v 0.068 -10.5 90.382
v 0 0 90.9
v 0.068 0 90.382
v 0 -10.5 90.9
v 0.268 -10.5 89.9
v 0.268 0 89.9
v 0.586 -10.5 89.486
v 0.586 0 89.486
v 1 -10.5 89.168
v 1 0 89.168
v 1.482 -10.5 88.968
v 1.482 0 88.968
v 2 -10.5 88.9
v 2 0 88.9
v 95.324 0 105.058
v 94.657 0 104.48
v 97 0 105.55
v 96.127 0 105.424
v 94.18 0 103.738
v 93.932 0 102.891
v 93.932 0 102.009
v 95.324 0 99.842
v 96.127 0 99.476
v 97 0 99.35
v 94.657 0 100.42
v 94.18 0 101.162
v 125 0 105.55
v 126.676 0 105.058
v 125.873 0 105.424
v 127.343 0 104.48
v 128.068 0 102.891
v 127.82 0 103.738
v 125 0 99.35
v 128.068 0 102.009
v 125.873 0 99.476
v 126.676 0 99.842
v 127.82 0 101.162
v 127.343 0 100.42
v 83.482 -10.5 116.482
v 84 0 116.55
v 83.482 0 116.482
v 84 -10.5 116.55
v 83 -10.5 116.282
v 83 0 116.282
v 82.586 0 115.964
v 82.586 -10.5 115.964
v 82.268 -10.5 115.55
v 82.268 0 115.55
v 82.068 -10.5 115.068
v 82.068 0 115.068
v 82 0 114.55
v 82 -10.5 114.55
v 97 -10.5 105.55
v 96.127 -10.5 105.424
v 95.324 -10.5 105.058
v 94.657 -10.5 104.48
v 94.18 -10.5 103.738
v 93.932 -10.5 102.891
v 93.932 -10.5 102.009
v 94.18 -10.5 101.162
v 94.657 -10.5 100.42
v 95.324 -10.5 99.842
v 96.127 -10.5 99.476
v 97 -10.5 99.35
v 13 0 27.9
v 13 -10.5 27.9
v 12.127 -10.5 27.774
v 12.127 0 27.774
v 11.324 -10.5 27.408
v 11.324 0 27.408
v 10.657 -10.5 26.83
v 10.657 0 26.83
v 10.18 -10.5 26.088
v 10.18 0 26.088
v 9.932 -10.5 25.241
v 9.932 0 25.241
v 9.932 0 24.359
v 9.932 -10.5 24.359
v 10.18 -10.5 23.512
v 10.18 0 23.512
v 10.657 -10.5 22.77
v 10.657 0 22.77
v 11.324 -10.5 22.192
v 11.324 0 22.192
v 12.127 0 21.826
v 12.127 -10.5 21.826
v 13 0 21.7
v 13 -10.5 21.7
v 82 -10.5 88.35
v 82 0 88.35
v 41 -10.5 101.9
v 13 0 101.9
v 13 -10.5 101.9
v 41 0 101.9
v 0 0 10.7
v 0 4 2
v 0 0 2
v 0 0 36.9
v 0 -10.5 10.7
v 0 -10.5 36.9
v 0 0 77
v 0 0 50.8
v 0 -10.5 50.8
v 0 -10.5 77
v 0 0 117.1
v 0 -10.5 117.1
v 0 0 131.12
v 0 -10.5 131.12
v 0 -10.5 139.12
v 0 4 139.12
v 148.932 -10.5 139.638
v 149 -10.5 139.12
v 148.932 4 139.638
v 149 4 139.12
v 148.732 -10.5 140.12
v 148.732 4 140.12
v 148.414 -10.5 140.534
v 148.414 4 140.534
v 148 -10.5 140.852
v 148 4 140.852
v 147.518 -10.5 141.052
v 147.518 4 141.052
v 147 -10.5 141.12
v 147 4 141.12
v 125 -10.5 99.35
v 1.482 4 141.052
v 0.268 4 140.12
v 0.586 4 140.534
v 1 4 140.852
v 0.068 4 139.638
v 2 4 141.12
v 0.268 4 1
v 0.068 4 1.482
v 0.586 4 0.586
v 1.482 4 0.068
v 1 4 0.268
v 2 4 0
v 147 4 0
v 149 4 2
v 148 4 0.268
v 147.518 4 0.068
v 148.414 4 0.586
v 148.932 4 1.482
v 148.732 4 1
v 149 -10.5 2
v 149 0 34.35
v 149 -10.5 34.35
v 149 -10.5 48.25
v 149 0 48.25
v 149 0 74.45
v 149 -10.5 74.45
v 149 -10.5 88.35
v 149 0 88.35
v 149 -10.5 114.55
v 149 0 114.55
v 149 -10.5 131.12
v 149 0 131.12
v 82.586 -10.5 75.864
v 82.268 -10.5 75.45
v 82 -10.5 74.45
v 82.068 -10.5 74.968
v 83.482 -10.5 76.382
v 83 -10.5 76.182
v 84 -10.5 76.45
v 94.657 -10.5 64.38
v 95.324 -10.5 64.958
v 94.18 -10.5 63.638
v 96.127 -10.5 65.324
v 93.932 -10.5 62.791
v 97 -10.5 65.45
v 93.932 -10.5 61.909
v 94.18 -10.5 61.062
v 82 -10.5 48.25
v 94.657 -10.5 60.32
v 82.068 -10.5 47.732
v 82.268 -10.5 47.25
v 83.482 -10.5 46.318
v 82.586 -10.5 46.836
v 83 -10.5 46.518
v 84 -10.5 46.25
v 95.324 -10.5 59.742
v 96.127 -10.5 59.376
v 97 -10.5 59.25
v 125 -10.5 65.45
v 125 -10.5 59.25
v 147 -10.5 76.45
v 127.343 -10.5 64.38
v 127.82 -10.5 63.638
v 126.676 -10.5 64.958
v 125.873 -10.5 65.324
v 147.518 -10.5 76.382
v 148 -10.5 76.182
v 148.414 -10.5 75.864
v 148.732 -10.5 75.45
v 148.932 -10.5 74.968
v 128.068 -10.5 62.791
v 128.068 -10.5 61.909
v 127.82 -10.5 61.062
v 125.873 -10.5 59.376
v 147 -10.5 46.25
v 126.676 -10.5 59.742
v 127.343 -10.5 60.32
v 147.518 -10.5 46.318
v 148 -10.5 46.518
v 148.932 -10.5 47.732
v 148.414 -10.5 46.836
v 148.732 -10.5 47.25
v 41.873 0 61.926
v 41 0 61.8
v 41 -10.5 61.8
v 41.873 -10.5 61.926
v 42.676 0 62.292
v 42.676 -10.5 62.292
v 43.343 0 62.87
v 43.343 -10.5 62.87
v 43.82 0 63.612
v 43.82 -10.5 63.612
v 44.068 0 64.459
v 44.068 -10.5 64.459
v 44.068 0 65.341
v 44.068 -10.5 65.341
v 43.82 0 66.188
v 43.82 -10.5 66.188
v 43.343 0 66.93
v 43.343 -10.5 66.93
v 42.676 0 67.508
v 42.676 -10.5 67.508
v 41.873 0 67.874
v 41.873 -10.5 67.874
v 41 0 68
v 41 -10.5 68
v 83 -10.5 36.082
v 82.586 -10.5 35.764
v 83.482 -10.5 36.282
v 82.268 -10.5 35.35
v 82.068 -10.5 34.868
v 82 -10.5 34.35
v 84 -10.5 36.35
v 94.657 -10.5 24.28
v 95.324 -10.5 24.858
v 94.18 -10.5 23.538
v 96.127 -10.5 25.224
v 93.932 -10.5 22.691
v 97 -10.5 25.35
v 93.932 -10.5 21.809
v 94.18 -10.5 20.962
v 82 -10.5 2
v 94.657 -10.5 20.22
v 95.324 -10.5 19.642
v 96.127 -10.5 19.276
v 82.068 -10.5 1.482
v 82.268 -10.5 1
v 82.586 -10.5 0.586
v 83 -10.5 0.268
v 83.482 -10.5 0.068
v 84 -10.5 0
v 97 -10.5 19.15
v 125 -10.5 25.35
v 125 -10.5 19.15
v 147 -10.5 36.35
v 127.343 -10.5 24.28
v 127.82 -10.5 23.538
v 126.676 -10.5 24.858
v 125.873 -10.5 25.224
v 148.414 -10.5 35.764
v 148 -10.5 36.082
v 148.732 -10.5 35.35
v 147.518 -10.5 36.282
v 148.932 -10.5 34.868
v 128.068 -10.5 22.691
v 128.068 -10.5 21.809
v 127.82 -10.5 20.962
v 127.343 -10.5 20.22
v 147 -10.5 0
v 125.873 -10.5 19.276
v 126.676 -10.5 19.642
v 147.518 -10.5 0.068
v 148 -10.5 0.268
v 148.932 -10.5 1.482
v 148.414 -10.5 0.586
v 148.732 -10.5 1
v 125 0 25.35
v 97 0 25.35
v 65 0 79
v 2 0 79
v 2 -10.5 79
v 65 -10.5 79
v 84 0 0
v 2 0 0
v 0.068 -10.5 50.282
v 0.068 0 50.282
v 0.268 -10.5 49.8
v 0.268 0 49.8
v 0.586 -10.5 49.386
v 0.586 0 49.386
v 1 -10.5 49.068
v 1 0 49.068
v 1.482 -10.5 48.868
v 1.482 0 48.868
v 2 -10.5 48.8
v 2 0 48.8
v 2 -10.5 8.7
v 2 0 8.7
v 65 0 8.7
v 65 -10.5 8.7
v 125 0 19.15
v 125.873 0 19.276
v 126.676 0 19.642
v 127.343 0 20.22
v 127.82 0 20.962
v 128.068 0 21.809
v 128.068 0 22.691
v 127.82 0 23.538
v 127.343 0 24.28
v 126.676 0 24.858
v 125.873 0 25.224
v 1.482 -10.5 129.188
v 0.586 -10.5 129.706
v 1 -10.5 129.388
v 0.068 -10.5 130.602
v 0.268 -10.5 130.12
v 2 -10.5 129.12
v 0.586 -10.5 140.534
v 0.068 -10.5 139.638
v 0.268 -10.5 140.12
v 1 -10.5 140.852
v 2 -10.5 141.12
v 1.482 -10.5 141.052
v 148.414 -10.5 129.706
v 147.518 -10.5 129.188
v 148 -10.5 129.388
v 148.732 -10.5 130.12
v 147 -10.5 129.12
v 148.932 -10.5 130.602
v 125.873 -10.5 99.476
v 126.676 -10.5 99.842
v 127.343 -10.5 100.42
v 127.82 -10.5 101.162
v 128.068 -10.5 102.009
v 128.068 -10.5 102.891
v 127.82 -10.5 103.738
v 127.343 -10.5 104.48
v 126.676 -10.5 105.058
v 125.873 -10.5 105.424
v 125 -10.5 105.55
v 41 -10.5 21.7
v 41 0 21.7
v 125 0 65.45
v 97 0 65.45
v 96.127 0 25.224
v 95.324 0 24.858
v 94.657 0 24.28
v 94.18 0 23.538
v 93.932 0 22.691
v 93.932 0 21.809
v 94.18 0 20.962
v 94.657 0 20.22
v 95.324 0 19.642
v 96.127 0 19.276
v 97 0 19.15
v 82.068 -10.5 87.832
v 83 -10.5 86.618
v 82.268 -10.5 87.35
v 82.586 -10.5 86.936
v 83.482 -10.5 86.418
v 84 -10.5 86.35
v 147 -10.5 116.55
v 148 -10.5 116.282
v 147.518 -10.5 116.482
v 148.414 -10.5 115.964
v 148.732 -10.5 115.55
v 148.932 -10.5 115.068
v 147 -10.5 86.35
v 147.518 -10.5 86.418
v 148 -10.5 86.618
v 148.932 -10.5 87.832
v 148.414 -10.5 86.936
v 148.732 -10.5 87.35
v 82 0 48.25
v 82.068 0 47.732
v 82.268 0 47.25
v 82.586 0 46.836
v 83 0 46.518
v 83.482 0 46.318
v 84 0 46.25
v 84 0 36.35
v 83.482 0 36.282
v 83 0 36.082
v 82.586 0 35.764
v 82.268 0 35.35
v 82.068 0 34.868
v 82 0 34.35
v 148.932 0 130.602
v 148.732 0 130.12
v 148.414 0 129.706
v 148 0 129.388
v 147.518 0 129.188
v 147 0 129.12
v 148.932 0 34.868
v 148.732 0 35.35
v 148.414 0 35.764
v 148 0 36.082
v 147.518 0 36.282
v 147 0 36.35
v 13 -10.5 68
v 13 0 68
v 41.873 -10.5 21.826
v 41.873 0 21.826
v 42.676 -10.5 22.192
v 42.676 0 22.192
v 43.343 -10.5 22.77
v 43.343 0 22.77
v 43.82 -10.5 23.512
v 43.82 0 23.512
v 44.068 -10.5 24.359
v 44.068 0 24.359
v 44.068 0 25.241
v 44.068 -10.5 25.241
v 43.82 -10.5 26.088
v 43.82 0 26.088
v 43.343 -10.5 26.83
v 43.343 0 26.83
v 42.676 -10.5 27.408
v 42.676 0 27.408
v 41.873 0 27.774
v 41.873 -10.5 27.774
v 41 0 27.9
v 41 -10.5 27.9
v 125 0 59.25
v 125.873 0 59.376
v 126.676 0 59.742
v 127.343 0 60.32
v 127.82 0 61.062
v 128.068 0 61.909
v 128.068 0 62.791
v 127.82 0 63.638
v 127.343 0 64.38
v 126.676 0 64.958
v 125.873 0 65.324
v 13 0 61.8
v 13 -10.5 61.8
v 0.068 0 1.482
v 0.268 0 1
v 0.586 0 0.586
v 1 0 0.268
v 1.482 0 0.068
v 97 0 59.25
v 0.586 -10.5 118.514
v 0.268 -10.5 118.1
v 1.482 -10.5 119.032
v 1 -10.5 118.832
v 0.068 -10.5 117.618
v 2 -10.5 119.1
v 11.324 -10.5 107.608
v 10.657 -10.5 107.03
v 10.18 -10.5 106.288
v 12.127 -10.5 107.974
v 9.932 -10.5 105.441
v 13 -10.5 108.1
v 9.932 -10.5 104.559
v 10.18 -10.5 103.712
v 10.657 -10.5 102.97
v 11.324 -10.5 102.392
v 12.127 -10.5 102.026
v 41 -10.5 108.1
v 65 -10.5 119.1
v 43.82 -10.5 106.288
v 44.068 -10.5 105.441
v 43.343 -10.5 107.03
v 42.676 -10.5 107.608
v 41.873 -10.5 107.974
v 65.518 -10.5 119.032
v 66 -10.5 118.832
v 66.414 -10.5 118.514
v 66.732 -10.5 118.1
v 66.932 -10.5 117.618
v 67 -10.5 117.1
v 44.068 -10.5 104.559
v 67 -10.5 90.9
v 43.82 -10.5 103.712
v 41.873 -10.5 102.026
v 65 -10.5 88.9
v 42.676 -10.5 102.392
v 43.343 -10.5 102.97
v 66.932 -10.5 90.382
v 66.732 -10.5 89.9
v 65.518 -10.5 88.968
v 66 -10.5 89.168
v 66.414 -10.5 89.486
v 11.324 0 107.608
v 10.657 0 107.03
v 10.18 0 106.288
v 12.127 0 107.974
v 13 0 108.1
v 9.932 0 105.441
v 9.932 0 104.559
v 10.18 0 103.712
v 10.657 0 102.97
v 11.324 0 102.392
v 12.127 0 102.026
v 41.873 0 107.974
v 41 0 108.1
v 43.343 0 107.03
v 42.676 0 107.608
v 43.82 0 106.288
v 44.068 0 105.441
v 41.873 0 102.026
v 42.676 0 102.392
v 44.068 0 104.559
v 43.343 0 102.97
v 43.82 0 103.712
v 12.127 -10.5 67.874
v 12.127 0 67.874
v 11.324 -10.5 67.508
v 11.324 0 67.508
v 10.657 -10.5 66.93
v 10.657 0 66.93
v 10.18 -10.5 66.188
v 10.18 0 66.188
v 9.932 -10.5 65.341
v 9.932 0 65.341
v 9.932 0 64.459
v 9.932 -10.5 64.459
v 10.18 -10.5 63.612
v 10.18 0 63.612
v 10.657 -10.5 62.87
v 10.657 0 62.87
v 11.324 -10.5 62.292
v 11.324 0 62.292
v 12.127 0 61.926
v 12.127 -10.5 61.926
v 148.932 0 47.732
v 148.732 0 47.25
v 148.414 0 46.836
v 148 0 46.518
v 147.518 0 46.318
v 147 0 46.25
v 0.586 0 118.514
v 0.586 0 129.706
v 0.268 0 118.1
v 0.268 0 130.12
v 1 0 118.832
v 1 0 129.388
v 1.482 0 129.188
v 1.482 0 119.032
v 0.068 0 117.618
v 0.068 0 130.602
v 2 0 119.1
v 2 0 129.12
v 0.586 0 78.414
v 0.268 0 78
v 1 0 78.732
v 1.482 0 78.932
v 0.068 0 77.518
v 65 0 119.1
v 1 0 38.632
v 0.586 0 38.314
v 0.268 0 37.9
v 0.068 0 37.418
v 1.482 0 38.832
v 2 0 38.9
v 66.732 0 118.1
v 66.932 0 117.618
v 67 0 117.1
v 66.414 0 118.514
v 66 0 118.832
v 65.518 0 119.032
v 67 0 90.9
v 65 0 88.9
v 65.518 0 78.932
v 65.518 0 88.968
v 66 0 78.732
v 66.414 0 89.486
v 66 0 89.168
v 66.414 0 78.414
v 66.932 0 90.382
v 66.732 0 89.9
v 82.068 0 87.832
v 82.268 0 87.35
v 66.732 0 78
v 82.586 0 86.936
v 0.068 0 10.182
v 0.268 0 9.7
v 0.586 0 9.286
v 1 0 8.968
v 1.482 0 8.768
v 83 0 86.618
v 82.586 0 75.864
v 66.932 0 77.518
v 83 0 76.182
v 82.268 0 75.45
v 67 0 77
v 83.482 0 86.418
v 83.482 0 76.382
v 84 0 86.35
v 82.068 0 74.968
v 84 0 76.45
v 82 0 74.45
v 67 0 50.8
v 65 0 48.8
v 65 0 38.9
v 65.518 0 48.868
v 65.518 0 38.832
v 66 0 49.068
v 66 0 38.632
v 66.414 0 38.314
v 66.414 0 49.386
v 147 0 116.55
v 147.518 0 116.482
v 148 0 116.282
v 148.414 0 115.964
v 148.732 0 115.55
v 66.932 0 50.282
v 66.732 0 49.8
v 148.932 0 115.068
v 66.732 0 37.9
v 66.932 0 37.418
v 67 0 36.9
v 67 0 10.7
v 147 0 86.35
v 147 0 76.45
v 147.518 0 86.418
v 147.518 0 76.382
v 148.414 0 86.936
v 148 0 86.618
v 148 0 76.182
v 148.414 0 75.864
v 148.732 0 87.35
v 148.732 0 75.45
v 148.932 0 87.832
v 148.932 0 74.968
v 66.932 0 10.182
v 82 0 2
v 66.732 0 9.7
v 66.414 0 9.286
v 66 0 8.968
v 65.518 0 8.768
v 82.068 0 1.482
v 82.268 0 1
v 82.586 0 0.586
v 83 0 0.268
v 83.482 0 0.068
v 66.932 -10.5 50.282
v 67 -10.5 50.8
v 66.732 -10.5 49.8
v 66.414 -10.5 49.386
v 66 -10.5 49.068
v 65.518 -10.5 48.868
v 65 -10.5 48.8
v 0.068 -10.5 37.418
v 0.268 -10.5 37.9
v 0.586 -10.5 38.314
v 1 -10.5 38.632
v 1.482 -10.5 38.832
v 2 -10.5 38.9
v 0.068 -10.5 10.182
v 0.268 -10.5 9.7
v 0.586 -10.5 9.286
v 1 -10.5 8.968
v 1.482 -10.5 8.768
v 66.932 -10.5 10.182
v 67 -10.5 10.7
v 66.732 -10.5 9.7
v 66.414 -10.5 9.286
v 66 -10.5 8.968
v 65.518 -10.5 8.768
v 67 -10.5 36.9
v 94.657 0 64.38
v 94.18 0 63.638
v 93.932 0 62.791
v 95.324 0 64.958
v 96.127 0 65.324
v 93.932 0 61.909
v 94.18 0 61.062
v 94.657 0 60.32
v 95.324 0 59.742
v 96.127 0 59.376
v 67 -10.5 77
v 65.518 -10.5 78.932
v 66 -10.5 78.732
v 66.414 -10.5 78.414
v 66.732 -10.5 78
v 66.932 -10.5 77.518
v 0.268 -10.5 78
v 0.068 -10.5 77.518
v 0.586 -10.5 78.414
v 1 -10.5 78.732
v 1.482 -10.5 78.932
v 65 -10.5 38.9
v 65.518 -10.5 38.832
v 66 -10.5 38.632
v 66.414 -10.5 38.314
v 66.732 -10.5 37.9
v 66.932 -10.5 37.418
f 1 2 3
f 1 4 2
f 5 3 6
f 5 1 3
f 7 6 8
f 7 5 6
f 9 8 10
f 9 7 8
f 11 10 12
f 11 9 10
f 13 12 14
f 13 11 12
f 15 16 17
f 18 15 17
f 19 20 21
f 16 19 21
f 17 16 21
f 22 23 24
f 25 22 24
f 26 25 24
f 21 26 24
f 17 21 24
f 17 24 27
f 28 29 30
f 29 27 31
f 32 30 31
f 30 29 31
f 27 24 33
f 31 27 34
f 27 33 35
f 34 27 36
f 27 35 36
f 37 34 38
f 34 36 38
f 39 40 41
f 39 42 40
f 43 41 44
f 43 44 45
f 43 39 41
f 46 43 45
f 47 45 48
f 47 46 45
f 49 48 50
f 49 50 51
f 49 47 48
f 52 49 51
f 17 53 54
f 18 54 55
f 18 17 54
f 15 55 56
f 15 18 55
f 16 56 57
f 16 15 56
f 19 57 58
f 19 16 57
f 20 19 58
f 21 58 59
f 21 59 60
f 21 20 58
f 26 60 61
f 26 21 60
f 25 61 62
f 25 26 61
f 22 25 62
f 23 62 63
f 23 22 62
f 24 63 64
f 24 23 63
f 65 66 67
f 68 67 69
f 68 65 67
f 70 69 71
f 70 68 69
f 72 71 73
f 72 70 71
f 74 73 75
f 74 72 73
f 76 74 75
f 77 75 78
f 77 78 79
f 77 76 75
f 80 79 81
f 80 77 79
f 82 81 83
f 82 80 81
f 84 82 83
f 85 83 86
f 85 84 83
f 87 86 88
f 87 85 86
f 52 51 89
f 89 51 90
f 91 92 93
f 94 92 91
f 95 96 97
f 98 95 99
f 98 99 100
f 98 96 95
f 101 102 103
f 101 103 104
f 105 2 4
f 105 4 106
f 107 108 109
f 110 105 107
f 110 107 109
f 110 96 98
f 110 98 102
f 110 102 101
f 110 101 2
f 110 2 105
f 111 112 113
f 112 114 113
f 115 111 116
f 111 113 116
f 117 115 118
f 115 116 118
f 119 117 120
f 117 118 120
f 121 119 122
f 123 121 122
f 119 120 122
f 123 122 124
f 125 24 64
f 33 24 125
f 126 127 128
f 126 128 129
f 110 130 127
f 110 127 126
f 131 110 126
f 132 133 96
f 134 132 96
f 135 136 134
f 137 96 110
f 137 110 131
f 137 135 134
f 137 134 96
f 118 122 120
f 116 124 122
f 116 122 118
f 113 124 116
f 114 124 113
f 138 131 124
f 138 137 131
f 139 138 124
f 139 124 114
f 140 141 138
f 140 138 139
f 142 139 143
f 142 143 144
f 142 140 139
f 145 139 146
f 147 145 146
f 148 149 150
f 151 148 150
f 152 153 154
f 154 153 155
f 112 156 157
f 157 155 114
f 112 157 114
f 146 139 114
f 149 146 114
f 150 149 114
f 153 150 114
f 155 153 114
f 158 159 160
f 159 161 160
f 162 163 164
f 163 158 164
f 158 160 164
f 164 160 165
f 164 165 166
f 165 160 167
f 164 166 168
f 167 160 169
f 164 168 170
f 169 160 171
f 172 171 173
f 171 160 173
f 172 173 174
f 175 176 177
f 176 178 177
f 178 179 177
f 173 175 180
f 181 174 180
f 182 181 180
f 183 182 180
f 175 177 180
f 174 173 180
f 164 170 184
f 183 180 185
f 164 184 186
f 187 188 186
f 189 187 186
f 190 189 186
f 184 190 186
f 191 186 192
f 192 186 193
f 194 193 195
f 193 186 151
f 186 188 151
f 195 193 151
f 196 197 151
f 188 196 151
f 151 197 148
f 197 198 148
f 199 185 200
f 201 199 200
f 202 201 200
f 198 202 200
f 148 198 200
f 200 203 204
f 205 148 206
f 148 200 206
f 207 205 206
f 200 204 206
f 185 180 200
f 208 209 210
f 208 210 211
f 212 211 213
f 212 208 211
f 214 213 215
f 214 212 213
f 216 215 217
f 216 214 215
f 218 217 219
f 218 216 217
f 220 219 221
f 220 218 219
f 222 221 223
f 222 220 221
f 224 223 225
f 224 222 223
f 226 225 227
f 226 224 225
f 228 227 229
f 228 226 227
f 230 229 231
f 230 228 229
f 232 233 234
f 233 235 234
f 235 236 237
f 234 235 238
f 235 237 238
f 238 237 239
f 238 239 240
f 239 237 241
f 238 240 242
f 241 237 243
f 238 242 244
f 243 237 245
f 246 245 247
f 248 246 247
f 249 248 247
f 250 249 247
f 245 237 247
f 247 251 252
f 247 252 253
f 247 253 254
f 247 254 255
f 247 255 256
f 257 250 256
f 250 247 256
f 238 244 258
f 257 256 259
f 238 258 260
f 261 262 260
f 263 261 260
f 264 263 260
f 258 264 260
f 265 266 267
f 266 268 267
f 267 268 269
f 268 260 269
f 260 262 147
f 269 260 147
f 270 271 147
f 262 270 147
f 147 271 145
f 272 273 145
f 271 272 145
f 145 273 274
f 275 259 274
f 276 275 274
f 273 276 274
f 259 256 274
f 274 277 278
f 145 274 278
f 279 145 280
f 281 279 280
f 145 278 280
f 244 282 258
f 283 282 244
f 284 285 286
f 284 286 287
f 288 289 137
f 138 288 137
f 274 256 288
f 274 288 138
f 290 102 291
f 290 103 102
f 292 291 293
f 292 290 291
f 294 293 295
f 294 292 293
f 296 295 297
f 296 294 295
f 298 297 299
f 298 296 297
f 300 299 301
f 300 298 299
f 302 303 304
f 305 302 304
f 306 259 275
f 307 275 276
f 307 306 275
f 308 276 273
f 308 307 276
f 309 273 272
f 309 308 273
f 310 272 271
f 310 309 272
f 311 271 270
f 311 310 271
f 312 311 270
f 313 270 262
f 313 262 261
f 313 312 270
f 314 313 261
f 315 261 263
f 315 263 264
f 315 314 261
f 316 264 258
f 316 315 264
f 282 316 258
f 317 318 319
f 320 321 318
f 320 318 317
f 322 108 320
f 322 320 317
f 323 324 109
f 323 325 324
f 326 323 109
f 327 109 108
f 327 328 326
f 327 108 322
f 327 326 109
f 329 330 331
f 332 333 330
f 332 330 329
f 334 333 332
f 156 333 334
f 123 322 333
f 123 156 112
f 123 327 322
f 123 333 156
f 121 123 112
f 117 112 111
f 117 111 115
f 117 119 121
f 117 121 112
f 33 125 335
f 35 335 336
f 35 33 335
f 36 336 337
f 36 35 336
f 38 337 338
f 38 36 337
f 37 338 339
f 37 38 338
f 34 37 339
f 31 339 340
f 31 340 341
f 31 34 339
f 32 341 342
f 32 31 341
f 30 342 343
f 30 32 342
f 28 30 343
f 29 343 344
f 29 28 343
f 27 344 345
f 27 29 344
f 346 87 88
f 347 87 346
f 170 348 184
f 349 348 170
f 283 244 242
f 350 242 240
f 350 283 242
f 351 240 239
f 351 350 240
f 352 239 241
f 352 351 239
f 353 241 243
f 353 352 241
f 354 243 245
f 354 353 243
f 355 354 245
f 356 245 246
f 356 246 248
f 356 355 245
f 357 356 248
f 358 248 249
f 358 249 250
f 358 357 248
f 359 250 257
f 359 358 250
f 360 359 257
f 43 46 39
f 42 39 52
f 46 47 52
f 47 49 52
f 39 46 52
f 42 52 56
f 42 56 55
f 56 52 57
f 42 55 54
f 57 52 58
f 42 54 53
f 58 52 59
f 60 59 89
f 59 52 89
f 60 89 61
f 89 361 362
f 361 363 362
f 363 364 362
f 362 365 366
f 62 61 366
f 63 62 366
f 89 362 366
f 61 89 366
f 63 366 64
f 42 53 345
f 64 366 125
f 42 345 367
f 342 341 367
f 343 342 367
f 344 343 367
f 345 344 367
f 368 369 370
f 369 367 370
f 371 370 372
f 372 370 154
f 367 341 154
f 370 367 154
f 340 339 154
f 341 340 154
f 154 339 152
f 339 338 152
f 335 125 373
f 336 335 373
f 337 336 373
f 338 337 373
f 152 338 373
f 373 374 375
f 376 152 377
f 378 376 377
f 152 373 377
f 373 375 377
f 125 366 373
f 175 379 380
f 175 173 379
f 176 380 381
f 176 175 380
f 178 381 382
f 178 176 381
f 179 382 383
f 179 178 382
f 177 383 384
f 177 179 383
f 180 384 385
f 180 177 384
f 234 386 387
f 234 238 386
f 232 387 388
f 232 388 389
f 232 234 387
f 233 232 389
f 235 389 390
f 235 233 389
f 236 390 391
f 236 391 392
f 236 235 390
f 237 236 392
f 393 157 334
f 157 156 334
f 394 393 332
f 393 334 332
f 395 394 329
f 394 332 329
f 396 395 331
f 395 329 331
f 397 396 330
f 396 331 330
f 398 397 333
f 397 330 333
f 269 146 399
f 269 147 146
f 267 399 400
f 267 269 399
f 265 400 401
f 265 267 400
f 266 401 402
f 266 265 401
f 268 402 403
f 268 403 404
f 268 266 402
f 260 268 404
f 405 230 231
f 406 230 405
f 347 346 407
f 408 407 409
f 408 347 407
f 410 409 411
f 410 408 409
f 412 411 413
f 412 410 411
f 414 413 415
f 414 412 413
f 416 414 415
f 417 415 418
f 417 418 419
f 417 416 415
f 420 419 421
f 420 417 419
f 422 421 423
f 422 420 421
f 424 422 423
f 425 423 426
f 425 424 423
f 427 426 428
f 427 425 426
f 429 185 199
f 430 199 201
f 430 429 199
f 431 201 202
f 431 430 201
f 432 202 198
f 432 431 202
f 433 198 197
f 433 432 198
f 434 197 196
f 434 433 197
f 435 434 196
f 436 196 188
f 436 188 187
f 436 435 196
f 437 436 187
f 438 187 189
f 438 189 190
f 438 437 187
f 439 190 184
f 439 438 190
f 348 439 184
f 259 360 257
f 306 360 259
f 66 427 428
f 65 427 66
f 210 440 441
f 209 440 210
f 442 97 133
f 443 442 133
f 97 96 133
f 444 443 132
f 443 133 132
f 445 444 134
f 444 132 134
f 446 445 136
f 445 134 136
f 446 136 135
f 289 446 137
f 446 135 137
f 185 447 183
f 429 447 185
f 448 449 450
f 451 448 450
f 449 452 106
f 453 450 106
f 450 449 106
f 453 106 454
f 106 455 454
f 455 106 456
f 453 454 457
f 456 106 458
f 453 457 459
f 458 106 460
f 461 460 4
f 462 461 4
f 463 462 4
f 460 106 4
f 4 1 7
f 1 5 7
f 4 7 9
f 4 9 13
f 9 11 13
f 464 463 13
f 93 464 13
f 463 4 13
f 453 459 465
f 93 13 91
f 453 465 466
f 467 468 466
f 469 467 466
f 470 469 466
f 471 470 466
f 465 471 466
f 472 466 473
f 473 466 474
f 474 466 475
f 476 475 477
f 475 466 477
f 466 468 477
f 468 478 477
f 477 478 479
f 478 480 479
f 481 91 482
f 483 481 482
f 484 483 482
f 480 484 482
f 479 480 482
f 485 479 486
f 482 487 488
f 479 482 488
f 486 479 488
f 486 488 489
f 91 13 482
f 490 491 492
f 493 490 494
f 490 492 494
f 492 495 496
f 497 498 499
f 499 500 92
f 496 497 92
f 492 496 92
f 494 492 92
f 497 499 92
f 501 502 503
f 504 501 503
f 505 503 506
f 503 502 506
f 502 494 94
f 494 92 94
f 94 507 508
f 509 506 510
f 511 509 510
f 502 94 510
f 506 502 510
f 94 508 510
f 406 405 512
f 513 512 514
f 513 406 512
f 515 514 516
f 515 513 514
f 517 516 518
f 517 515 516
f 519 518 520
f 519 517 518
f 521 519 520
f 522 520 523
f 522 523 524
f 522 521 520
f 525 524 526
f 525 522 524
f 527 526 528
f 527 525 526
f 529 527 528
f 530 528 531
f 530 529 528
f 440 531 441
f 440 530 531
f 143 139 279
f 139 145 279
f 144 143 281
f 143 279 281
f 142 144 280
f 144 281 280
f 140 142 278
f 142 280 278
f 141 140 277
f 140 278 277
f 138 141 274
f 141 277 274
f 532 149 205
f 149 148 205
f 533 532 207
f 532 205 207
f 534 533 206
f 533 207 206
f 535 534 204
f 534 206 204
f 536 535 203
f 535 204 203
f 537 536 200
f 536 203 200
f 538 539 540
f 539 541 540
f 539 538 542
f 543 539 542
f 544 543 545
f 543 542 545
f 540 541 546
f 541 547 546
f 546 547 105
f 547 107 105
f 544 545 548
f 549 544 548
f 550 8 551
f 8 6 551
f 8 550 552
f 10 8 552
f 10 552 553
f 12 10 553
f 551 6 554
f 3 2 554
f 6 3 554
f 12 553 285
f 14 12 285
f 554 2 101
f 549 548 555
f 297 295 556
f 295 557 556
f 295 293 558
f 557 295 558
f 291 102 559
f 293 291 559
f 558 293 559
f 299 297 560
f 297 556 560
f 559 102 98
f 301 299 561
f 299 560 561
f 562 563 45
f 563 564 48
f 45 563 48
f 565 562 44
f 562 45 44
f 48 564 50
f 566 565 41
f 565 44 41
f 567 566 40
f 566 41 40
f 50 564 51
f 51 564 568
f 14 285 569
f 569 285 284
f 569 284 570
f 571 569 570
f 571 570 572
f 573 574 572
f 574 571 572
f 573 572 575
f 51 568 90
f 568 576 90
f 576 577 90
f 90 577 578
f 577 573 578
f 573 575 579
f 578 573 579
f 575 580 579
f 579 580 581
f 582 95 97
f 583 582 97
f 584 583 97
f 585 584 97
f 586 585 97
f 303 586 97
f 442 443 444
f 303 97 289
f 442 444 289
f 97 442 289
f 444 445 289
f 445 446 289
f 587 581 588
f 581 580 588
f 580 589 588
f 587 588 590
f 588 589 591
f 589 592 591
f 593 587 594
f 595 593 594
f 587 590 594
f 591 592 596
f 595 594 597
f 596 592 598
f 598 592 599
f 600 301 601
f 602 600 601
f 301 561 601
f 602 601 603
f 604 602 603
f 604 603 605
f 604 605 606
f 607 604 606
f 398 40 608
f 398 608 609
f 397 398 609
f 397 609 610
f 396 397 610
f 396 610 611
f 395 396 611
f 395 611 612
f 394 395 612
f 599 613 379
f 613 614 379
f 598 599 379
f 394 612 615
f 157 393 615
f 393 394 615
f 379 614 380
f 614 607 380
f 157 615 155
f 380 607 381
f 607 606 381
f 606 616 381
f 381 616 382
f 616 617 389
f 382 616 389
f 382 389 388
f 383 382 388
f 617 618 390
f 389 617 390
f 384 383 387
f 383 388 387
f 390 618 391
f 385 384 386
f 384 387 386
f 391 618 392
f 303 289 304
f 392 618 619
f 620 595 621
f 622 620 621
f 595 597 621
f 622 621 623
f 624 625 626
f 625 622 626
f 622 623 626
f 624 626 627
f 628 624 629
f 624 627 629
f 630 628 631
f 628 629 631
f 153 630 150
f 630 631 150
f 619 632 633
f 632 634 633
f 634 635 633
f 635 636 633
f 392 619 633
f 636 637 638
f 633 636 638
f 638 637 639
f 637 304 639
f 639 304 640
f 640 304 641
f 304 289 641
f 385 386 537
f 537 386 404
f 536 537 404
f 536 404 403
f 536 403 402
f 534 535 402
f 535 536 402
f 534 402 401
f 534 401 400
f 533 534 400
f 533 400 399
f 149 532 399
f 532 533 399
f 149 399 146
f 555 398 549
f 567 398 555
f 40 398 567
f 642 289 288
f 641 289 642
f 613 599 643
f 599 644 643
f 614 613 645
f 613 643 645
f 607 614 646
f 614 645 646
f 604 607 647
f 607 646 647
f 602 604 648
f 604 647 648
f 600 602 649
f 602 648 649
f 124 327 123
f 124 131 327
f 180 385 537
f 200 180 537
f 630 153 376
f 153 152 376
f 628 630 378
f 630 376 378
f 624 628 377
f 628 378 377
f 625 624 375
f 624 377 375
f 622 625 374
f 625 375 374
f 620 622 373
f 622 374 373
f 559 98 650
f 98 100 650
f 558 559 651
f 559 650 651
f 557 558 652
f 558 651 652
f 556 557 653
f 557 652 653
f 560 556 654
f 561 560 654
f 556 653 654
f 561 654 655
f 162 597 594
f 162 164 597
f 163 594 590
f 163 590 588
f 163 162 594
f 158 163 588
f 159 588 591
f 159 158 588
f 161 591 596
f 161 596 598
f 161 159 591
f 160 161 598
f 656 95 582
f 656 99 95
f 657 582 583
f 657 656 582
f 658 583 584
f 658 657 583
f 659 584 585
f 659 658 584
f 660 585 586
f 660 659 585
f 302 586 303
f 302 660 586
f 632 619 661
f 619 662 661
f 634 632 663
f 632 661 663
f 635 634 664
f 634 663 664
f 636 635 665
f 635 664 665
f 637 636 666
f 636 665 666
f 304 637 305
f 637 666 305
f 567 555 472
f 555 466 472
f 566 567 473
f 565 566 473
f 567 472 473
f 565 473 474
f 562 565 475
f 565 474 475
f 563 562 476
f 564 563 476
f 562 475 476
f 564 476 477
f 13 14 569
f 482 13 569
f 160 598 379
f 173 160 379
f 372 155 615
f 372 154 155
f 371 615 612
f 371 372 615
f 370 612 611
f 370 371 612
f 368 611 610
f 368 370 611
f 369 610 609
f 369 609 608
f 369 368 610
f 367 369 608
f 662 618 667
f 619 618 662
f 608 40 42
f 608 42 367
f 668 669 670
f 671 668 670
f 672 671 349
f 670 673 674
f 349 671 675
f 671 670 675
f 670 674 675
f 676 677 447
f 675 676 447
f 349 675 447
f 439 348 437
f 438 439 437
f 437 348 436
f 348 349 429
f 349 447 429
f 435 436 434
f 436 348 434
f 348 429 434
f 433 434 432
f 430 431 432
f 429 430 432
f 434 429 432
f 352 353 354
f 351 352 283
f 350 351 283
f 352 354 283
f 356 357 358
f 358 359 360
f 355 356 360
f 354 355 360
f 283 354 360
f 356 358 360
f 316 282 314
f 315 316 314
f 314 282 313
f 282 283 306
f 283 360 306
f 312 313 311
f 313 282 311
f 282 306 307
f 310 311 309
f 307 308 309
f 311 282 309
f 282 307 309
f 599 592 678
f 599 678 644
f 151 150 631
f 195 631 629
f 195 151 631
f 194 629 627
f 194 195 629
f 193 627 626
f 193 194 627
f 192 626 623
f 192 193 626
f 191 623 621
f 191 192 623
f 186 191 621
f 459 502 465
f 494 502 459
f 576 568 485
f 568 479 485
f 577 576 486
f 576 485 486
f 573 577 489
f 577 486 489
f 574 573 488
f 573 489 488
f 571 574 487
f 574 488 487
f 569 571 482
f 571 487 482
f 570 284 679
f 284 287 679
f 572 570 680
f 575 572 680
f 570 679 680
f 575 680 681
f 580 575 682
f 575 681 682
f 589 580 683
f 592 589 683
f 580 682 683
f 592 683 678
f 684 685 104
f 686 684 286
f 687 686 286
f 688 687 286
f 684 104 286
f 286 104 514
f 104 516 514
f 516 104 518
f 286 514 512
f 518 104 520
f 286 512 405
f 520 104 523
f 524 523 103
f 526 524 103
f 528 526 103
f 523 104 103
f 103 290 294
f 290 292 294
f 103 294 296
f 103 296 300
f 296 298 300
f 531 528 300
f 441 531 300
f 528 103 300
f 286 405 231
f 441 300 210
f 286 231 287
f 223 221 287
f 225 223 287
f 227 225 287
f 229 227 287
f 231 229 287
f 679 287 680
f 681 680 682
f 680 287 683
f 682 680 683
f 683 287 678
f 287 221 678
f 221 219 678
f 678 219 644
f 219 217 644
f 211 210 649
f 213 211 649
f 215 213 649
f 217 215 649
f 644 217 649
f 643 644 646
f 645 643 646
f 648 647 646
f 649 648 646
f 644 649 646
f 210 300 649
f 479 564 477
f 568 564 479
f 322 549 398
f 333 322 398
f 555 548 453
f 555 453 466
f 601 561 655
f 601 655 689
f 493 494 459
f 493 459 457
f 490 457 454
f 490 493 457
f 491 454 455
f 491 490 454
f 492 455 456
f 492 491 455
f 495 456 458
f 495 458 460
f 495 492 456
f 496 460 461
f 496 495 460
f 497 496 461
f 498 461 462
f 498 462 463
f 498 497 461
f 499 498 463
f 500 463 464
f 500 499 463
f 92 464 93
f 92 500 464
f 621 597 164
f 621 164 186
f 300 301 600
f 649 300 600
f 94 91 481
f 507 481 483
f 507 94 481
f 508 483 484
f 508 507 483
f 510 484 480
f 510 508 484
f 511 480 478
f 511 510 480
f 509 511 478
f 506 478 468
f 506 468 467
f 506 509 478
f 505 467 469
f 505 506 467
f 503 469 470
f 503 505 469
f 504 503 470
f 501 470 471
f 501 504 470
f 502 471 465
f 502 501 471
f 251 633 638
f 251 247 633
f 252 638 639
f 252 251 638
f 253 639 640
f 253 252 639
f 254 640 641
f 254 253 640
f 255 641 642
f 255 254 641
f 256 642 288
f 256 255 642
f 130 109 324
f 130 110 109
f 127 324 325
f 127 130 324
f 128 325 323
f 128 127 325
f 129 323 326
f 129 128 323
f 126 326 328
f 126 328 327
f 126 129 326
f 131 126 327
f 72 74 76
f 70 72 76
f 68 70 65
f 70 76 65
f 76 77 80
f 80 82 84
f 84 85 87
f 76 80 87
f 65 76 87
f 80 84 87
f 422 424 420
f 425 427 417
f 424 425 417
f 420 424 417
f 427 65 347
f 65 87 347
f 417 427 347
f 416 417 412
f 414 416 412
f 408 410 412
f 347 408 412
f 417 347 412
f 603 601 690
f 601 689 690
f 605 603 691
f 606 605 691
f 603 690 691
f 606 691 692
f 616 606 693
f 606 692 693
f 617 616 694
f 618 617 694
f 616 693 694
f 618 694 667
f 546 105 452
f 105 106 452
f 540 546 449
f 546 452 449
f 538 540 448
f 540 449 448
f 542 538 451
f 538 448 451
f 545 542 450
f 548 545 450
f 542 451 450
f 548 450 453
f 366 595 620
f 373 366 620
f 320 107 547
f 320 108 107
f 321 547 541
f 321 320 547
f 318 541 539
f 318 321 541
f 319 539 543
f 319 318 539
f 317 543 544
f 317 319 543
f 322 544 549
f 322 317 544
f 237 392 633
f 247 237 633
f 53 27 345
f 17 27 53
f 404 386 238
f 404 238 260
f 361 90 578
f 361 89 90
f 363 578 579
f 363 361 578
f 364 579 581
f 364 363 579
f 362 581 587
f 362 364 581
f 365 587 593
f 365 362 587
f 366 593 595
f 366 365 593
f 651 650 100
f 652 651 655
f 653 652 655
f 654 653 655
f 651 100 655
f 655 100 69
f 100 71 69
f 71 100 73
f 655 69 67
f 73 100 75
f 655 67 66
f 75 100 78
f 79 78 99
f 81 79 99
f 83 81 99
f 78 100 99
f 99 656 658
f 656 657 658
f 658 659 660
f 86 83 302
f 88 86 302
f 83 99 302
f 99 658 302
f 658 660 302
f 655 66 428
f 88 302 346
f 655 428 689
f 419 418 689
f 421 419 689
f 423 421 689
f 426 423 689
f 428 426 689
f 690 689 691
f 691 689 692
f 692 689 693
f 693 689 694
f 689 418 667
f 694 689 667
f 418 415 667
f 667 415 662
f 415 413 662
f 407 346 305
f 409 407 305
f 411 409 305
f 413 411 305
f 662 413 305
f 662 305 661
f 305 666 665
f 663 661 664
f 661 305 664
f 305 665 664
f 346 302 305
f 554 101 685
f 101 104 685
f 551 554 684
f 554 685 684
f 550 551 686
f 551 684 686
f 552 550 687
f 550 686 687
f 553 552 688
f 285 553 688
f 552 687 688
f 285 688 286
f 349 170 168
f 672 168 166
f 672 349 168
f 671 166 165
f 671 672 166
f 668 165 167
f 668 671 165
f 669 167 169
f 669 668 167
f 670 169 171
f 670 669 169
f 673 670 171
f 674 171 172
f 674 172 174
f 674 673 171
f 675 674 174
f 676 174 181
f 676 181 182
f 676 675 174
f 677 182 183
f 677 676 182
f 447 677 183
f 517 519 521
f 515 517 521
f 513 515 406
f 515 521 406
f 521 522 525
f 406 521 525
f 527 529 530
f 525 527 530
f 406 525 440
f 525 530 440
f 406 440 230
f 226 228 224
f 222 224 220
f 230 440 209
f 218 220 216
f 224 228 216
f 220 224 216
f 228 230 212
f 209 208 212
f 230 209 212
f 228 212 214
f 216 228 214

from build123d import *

# Parameters (mm, degrees)
SKETCH3_W           = 149
SKETCH3_H           = 141.12
BOSS_EXTRUDE1_DEPTH = 4
SKETCH5_W           = 67
SKETCH5_H           = 30.2
SKETCH5_H_2         = 36.35
BOSS_EXTRUDE2_DEPTH = 14.5
FILLET1_R           = 2
SKETCH6_W           = 149
SKETCH6_H           = 12
BOSS_EXTRUDE3_DEPTH = 10.5
FILLET2_R           = 2


with BuildPart() as part:
    # Sketch3 → Boss-Extrude1 (new body)
    with BuildSketch(Plane(origin=(0, 0, 0), x_dir=(1, 0, 0), z_dir=(0, 1, 0))):
        with Locations((74.5, -70.56)):
            Rectangle(SKETCH3_W, SKETCH3_H)
    extrude(amount=BOSS_EXTRUDE1_DEPTH)

    # Sketch5 → Boss-Extrude2 (add)
    # profile 1 of 6: a face of its own
    with BuildSketch(Plane(origin=(0, 4, 0), x_dir=(1, 0, 0), z_dir=(0, 1, 0))):
        with Locations((33.5, -23.8)):
            Rectangle(SKETCH5_W, SKETCH5_H)
        with BuildLine():
            ThreePointArc((13, -27.9), (9.9, -24.8), (13, -21.7))
            Line((13, -21.7), (41, -21.7))
            ThreePointArc((41, -21.7), (44.1, -24.8), (41, -27.9))
            Line((41, -27.9), (13, -27.9))
        make_face(mode=Mode.SUBTRACT)
    # profile 2 of 6: a face of its own
    with BuildSketch(Plane(origin=(0, 4, 0), x_dir=(1, 0, 0), z_dir=(0, 1, 0))):
        with Locations((115.5, -18.175)):
            Rectangle(SKETCH5_W, SKETCH5_H_2)
        with BuildLine():
            ThreePointArc((97, -25.35), (93.9, -22.25), (97, -19.15))
            Line((97, -19.15), (125, -19.15))
            ThreePointArc((125, -19.15), (128.1, -22.25), (125, -25.35))
            Line((125, -25.35), (97, -25.35))
        make_face(mode=Mode.SUBTRACT)
    # profile 3 of 6: a face of its own
    with BuildSketch(Plane(origin=(0, 4, 0), x_dir=(1, 0, 0), z_dir=(0, 1, 0))):
        with Locations((33.5, -63.9)):
            Rectangle(SKETCH5_W, SKETCH5_H)
        with BuildLine():
            ThreePointArc((13, -68), (9.9, -64.9), (13, -61.8))
            Line((13, -61.8), (41, -61.8))
            ThreePointArc((41, -61.8), (44.1, -64.9), (41, -68))
            Line((41, -68), (13, -68))
        make_face(mode=Mode.SUBTRACT)
    # profile 4 of 6: a face of its own
    with BuildSketch(Plane(origin=(0, 4, 0), x_dir=(1, 0, 0), z_dir=(0, 1, 0))):
        with Locations((115.5, -61.35)):
            Rectangle(SKETCH5_W, SKETCH5_H)
        with BuildLine():
            ThreePointArc((97, -65.45), (93.9, -62.35), (97, -59.25))
            Line((97, -59.25), (125, -59.25))
            ThreePointArc((125, -59.25), (128.1, -62.35), (125, -65.45))
            Line((125, -65.45), (97, -65.45))
        make_face(mode=Mode.SUBTRACT)
    # profile 5 of 6: a face of its own
    with BuildSketch(Plane(origin=(0, 4, 0), x_dir=(1, 0, 0), z_dir=(0, 1, 0))):
        with Locations((33.5, -104)):
            Rectangle(SKETCH5_W, SKETCH5_H)
        with BuildLine():
            ThreePointArc((13, -108.1), (9.9, -105), (13, -101.9))
            Line((13, -101.9), (41, -101.9))
            ThreePointArc((41, -101.9), (44.1, -105), (41, -108.1))
            Line((41, -108.1), (13, -108.1))
        make_face(mode=Mode.SUBTRACT)
    # profile 6 of 6: a face of its own
    with BuildSketch(Plane(origin=(0, 4, 0), x_dir=(1, 0, 0), z_dir=(0, 1, 0))):
        with Locations((115.5, -101.45)):
            Rectangle(SKETCH5_W, SKETCH5_H)
        with BuildLine():
            ThreePointArc((97, -105.55), (93.9, -102.45), (97, -99.35))
            Line((97, -99.35), (125, -99.35))
            ThreePointArc((125, -99.35), (128.1, -102.45), (125, -105.55))
            Line((125, -105.55), (97, -105.55))
        make_face(mode=Mode.SUBTRACT)
    extrude(amount=-BOSS_EXTRUDE2_DEPTH)

    # Fillet1
    fillet1_edges = [part.edges().sort_by_distance(p)[0] for p in [
        (67, -5.25, 48.8),
        (67, -5.25, 79),
        (0, -5.25, 79),
        (0, -5.25, 48.8),
        (82, -5.25, 46.25),
        (149, -5.25, 46.25),
        (149, -5.25, 76.45),
        (82, -5.25, 76.45),
        (67, -5.25, 88.9),
        (67, -5.25, 119.1),
        (0, -5.25, 119.1),
        (0, -5.25, 88.9),
        (82, -5.25, 86.35),
        (149, -5.25, 86.35),
        (149, -5.25, 116.55),
        (82, -5.25, 116.55),
        (67, -5.25, 8.7),
        (67, -5.25, 38.9),
        (0, -5.25, 38.9),
        (0, -5.25, 8.7),
        (82, -5.25, 0),
        (149, -5.25, 36.35),
        (82, -5.25, 36.35),
        (149, -3.25, 0),
    ]]
    fillet(fillet1_edges, radius=FILLET1_R)

    # Sketch6 → Boss-Extrude3 (add)
    with BuildSketch(Plane.XZ):
        with Locations((74.5, 135.12)):
            Rectangle(SKETCH6_W, SKETCH6_H)
    extrude(amount=BOSS_EXTRUDE3_DEPTH)

    # Fillet2
    fillet2_edges = [part.edges().sort_by_distance(p)[0] for p in [
        (0, -5.25, 129.12),
        (149, -5.25, 129.12),
        (0, 2, 0),
        (149, -3.25, 141.12),
        (0, -3.25, 141.12),
    ]]
    fillet(fillet2_edges, radius=FILLET2_R)


solid = part.part
